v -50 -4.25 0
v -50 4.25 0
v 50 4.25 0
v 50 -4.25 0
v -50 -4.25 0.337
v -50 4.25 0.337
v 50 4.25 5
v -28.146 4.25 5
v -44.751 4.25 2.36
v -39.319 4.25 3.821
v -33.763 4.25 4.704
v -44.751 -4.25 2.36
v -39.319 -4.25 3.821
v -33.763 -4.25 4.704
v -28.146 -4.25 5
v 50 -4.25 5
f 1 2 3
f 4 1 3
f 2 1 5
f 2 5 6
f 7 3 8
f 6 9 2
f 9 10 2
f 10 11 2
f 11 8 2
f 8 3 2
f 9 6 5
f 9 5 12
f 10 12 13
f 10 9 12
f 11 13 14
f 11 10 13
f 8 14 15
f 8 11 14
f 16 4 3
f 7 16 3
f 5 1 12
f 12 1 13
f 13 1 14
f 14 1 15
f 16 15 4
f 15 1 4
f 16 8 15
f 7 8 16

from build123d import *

# Parameters (mm, degrees)
F0_W        = 50
F0_H        = 8.5
F1_DEPTH    = 5
F2_SIZE2    = 4.6630765815
F2_SIZE     = 10
F3_T1_DEPTH = 67.7710723862


# Not quite as in the source:
# - a fillet or chamfer that OpenCascade refuses, or shapes differently, is made with other operations: its cross-section is extruded or revolved along the edge and cut away or added
# - a feature of the source that left no trace in its solid (it failed there, or was rolled back) is left out


with BuildPart() as f1:
    # F0 (on Top) → F1 (new body)
    with BuildSketch(Plane.XY):
        with Locations((-25, 0)):
            Rectangle(F0_W, F0_H)
        with Locations((25, 0)):
            Rectangle(F0_W, F0_H)
    extrude(amount=F1_DEPTH)

    # F2
    f2_edges = [f1.edges().sort_by_distance(p)[0] for p in [
        (-50, 0, 5),
    ]]
    f2_side = f1.faces().sort_by_distance((0, 0, 5))[0]
    chamfer(f2_edges, length=F2_SIZE, length2=F2_SIZE2, reference=f2_side)

    # F3: fillet of radius 53.5430809348 on 1 edges, made by hand

    # F3_s2 → F3_t1 (cut)
    with BuildSketch(Plane.XZ.offset(-33.8855361931)):
        with BuildLine():
            ThreePointArc((-50, 0.3369234184), (-39.3188667185, 3.8212559042), (-28.1457855228, 5))
            Line((-28.1457855228, 5), (-40, 5))
            Line((-40, 5), (-50, 0.3369234184))
        make_face()
    extrude(amount=F3_T1_DEPTH, mode=Mode.SUBTRACT)


solid = f1.part
